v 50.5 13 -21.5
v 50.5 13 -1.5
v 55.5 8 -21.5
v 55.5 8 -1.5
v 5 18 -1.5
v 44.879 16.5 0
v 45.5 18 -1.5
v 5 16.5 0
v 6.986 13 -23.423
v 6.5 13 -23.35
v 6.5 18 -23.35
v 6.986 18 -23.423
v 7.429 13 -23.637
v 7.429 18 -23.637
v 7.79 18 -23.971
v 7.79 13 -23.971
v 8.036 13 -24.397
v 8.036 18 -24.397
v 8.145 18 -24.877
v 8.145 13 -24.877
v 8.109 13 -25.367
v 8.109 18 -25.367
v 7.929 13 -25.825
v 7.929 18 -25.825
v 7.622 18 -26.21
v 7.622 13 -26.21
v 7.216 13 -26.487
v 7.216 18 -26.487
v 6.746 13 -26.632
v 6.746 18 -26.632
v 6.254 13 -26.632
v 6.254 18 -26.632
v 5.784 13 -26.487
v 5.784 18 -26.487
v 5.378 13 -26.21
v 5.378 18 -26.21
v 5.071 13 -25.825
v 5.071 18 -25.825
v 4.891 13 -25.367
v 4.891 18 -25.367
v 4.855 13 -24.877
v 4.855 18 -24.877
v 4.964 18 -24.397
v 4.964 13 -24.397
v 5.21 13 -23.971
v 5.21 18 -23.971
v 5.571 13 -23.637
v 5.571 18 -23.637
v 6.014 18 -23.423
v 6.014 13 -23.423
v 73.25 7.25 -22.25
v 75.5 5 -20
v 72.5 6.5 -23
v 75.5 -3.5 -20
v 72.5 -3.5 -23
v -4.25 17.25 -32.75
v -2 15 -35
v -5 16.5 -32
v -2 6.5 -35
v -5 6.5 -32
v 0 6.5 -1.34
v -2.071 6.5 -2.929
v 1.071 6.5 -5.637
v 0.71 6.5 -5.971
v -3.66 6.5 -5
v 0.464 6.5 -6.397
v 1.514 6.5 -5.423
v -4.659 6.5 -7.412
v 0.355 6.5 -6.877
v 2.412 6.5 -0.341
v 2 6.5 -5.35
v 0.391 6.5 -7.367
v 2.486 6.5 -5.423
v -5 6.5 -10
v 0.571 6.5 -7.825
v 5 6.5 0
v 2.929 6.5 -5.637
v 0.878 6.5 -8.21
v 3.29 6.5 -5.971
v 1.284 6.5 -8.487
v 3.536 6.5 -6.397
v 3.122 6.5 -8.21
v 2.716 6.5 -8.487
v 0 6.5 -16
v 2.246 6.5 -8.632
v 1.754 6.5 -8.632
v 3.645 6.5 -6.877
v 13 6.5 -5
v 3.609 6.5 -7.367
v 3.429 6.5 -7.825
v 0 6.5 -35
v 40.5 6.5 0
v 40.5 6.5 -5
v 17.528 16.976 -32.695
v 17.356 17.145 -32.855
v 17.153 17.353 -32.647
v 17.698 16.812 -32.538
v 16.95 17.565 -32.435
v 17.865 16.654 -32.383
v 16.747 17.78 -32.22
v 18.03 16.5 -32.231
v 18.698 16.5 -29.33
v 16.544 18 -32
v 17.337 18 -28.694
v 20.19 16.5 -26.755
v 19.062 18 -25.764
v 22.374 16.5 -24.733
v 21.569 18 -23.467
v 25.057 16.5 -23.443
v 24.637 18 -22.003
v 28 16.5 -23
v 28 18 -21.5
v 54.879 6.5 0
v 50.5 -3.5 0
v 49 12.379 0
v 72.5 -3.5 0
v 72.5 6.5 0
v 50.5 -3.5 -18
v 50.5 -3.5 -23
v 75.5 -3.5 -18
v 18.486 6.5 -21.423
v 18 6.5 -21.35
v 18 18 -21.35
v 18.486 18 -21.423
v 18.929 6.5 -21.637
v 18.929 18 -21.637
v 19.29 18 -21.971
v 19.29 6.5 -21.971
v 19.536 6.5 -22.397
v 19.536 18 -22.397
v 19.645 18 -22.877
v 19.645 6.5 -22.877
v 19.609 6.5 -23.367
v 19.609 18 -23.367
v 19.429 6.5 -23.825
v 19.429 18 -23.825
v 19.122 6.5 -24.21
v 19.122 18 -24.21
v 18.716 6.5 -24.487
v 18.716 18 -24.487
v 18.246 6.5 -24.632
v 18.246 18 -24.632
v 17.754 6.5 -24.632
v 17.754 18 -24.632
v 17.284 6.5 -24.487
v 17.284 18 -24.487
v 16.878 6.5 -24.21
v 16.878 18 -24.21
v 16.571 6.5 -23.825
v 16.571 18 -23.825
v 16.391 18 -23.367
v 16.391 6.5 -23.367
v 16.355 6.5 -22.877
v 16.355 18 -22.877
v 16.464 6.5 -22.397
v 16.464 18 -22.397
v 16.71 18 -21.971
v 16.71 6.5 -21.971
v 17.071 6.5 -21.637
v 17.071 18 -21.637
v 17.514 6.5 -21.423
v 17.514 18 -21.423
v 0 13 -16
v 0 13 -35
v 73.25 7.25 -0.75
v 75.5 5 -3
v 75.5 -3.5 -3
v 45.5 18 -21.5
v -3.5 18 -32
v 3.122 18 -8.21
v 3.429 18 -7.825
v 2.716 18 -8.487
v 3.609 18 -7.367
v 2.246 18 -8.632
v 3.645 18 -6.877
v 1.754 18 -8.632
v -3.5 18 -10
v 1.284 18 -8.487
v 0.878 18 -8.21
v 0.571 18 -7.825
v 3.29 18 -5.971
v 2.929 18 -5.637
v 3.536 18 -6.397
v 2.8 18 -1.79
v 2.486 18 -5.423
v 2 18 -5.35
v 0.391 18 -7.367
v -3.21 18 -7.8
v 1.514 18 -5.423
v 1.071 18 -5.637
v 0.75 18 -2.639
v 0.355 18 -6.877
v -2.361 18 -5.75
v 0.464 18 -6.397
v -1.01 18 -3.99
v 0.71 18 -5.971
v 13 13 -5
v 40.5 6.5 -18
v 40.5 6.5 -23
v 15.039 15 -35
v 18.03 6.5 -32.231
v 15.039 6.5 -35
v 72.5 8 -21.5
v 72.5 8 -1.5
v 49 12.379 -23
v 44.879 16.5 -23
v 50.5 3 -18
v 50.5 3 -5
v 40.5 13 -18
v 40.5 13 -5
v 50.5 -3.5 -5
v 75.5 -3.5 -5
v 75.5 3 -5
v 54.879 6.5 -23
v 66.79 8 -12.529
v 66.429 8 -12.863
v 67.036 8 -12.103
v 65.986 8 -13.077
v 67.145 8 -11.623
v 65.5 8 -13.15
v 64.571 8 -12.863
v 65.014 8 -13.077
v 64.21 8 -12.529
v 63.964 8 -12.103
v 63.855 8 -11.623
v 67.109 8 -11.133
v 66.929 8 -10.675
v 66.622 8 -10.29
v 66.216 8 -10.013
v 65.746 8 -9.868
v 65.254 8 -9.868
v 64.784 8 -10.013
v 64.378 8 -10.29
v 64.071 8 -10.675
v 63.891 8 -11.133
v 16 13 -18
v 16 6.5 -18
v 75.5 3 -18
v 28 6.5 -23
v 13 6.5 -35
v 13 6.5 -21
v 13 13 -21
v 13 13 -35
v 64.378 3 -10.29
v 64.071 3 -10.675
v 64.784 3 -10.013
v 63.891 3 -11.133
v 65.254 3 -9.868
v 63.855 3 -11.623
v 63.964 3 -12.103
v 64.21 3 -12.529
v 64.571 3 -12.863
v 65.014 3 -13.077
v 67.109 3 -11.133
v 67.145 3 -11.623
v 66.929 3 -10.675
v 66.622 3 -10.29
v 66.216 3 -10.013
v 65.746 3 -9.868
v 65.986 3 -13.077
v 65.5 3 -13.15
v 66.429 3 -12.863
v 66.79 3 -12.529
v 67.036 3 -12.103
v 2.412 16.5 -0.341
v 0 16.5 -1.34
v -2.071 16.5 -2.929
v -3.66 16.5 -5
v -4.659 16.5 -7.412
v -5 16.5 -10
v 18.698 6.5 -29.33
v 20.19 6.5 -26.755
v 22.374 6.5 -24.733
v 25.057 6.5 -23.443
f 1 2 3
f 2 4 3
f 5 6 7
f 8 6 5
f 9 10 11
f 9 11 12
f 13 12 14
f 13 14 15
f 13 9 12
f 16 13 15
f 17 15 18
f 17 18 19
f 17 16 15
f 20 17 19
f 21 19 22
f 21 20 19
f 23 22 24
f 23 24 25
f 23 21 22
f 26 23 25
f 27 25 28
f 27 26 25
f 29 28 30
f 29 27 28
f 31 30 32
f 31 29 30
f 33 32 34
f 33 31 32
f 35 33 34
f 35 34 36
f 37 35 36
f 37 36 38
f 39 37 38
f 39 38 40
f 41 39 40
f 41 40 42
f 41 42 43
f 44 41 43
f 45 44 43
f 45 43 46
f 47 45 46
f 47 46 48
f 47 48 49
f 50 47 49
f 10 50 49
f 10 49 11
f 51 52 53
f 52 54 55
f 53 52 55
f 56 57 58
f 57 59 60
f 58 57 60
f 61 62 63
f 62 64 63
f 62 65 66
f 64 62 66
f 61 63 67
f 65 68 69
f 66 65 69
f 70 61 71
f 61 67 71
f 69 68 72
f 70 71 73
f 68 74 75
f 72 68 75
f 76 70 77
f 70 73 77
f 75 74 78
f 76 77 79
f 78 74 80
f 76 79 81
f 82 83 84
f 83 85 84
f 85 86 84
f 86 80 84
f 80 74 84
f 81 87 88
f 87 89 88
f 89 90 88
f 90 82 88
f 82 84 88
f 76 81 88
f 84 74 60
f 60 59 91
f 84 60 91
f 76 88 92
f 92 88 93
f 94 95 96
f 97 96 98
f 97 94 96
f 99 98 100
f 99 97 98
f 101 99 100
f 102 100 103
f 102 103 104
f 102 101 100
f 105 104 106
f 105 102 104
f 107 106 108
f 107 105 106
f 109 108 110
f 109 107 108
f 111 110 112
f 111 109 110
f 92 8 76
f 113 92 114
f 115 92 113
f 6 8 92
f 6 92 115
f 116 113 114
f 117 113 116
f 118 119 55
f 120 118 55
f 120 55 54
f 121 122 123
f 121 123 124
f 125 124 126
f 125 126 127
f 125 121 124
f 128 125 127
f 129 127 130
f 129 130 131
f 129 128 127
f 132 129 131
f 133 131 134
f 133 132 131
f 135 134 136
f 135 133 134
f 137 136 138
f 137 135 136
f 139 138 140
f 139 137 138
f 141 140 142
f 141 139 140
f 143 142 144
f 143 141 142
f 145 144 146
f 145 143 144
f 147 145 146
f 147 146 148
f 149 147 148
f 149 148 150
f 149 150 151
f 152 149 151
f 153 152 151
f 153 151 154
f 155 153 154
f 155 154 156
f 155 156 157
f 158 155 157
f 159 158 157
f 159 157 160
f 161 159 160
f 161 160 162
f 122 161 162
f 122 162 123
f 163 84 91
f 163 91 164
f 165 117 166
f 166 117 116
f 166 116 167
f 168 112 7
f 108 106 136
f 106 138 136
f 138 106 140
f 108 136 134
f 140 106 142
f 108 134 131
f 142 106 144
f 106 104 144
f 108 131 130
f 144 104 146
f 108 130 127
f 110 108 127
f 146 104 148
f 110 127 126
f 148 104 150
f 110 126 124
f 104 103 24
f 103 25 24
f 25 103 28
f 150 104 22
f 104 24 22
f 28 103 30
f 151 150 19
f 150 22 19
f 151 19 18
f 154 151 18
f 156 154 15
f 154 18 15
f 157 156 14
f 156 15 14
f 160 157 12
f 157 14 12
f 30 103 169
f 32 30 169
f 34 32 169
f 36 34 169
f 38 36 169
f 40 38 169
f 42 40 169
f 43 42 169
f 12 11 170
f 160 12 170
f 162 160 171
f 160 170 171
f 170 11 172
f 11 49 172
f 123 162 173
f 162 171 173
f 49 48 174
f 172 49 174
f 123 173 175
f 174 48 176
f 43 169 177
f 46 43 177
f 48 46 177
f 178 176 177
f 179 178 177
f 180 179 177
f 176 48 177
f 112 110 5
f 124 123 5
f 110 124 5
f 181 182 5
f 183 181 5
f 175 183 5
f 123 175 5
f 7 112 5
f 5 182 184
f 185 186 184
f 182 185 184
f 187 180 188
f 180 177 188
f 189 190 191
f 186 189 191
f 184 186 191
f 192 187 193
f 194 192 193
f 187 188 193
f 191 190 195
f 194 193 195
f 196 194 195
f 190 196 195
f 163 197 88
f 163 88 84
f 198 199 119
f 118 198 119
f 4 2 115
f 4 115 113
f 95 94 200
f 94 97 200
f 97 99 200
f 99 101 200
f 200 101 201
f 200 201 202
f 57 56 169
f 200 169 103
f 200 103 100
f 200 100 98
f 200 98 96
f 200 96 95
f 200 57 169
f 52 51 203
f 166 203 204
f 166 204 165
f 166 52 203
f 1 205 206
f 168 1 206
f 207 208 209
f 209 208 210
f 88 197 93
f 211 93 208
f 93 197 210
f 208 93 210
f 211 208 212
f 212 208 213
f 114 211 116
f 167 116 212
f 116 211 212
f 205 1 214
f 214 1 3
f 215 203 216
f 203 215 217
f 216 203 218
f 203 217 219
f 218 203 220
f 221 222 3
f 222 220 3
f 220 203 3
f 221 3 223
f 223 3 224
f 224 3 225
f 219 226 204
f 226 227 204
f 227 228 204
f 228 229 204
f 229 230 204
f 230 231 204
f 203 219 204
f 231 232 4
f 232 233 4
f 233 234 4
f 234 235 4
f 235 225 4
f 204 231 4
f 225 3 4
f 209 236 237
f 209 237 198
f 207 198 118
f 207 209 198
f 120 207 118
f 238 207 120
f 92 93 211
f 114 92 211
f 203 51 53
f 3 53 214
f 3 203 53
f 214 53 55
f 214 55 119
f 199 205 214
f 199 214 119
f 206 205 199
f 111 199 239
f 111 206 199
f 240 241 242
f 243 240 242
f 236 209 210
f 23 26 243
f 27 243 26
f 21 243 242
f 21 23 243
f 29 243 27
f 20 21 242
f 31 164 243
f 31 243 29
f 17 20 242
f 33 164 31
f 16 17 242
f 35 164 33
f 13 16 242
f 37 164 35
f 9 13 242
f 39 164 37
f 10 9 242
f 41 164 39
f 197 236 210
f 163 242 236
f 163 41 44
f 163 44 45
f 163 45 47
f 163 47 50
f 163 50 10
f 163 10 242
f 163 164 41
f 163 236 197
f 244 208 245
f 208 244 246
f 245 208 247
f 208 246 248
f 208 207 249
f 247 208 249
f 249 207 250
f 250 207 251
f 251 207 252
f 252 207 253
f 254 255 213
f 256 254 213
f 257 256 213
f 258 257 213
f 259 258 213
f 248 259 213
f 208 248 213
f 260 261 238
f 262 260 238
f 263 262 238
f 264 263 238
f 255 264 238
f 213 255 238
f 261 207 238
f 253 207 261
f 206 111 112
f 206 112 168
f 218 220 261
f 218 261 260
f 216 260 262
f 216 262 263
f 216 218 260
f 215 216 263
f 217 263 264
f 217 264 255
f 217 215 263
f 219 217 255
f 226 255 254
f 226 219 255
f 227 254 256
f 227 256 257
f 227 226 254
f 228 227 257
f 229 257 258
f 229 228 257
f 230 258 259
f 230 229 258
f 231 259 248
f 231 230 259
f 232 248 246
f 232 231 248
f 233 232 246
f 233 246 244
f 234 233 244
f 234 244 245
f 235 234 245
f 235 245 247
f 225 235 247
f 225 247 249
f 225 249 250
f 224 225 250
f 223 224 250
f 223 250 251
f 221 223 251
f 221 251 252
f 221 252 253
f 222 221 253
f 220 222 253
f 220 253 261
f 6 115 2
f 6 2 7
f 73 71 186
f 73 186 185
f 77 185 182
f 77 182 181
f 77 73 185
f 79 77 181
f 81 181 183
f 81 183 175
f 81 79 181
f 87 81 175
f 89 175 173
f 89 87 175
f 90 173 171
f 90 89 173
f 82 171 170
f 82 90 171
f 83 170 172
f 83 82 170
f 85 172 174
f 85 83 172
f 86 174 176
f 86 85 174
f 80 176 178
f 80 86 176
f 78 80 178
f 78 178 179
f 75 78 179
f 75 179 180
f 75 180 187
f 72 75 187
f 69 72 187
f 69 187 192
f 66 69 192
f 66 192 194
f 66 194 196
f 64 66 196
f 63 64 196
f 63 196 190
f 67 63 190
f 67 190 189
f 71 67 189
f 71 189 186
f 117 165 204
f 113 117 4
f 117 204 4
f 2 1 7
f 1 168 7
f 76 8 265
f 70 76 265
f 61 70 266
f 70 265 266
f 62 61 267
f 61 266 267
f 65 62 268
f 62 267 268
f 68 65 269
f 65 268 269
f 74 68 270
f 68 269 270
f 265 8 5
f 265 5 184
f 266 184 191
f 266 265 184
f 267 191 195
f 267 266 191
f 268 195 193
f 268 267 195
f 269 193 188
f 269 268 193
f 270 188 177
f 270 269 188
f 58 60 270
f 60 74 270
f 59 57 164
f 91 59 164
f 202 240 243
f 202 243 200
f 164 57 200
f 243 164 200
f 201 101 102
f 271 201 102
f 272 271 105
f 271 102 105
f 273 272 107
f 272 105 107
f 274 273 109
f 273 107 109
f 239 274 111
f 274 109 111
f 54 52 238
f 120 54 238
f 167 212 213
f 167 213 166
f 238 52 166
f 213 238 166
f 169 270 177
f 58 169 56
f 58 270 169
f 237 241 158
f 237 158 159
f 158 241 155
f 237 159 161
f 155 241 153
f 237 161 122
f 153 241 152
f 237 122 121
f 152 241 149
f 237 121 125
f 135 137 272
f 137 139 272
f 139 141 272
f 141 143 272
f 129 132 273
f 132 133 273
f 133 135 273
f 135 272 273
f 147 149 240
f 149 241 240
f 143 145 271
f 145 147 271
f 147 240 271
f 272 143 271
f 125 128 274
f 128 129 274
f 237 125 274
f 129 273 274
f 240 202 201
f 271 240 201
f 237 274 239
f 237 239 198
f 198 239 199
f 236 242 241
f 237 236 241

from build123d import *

# Parameters (mm, degrees)
SKETCH_1_W          = 23
SKETCH_1_H          = 23
SKETCH_1_W_2        = 13
SKETCH_1_H_2        = 13
EXTRUDE_1_DEPTH     = 35
SKETCH_2_R          = 1.65
CUT_EXTRUDE_1_DEPTH = 34
SKETCH_4_W          = 23
SKETCH_4_H          = 23
SKETCH_4_R          = 3
EXTRUDE_2_DEPTH     = 3.5
SKETCH_5_W          = 23
SKETCH_5_H          = 23
SKETCH_5_W_2        = 13
SKETCH_5_H_2        = 13
EXTRUDE_1_2_DEPTH   = 54
SKETCH_6_R          = 1.65
CUT_EXTRUDE_2_DEPTH = 39
SKETCH_7_W          = 13
SKETCH_7_H          = 13
CUT_EXTRUDE_3_DEPTH = 13
CHAMFER_1_SIZE      = 3
SKETCH_8_W          = 80.5
SKETCH_8_H          = 35
CUT_EXTRUDE_4_DEPTH = 11.5
EXTRUDE_3_DEPTH     = 6.5
FILLET_1_R          = 10
FILLET_2_R          = 10
SKETCH_10_R         = 1.65
CUT_EXTRUDE_5_DEPTH = 28.5
CHAMFER_4_SIZE      = 3
CHAMFER_START       = 6.5
CHAMFER_5_DEPTH     = 11.5
SKETCH_11_W         = 10
SKETCH_11_H         = 13
EXTRUDE_4_DEPTH     = 10
CHAMFER_9_SIZE      = 5
CHAMFER_10_SIZE     = 5
CHAMFER_11_SIZE     = 10
CHAMFER_12_SIZE     = 10
CHAMFER_13_SIZE     = 1.5
CHAMFER_14_SIZE     = 1.5
SKETCH_12_W         = 99.580162389
SKETCH_12_H         = 41.70081518
CUT_EXTRUDE_6_DEPTH = 35


with BuildPart() as part:
    # 草图1 → Extrude 1 (new body)
    with BuildSketch(Plane.XY):
        with Locations((6.5, 6.5)):
            Rectangle(SKETCH_1_W, SKETCH_1_H)
        with Locations((6.5, 6.5)):
            Rectangle(SKETCH_1_W_2, SKETCH_1_H_2, mode=Mode.SUBTRACT)
    extrude(amount=EXTRUDE_1_DEPTH)

    # 草图2 → 切除-拉伸1 (cut)
    with BuildSketch(Plane.XZ.offset(5)):
        with Locations(Location((6.5, 25, 0), (0, 0, 270))):
            Circle(SKETCH_2_R)
    extrude(amount=-CUT_EXTRUDE_1_DEPTH, mode=Mode.SUBTRACT)

    # 草图4 → 凸台-拉伸2 (add)
    with BuildSketch(Plane(origin=(18, 0, 0), x_dir=(0, 0, -1), z_dir=(1, 0, 0))):
        with Locations((-11.5, 6.5)):
            Rectangle(SKETCH_4_W, SKETCH_4_H)
        with Locations(Location((-11.5, 6.5, 0), (0, 0, 90))):
            Circle(SKETCH_4_R, mode=Mode.SUBTRACT)
    extrude(amount=EXTRUDE_2_DEPTH)

    # 草图5 → Extrude 1 2 (add)
    with BuildSketch(Plane(origin=(21.5, 0, 0), x_dir=(0, 0, -1), z_dir=(1, 0, 0))):
        with Locations((-11.5, 6.5)):
            Rectangle(SKETCH_5_W, SKETCH_5_H)
        with Locations((-11.5, 6.5)):
            Rectangle(SKETCH_5_W_2, SKETCH_5_H_2, mode=Mode.SUBTRACT)
    extrude(amount=EXTRUDE_1_2_DEPTH)

    # 草图6 → 切除-拉伸2 (cut)
    with BuildSketch(Plane(origin=(0, 18, 0), x_dir=(1, 0, 0), z_dir=(0, 1, 0))):
        with Locations(Location((65.5, -11.5, 0), (0, 0, 270))):
            Circle(SKETCH_6_R)
    extrude(amount=-CUT_EXTRUDE_2_DEPTH, mode=Mode.SUBTRACT)

    # 草图7 → 切除-拉伸3 (cut)
    with BuildSketch(Plane(origin=(21.5, 0, 0), x_dir=(0, 0, -1), z_dir=(1, 0, 0))):
        with Locations((-11.5, 6.5)):
            Rectangle(SKETCH_7_W, SKETCH_7_H)
    extrude(amount=-CUT_EXTRUDE_3_DEPTH, mode=Mode.SUBTRACT)

    # 倒角1
    chamfer_1_edges = [part.edges().sort_by_distance(p)[0] for p in [
        (13, 6.5, 18),
    ]]
    chamfer(chamfer_1_edges, length=CHAMFER_1_SIZE)

    # 草图8 → 切除-拉伸4 (cut)
    with BuildSketch(Plane.XZ.offset(5)):
        with Locations((35.25, 17.5)):
            Rectangle(SKETCH_8_W, SKETCH_8_H)
    extrude(amount=-CUT_EXTRUDE_4_DEPTH, mode=Mode.SUBTRACT)

    # 草图9 → 凸台-拉伸3 (add)
    with BuildSketch(Plane.XZ.offset(-13)):
        Polygon((13, 5), (0, 16), (0, 0), (13, 0), align=None)
    extrude(amount=EXTRUDE_3_DEPTH)

    # 圆角1
    fillet_1_edges = [part.edges().sort_by_distance(p)[0] for p in [
        (-5, 12.25, 0),
    ]]
    fillet(fillet_1_edges, radius=FILLET_1_R)

    # 圆角2
    fillet_2_edges = [part.edges().sort_by_distance(p)[0] for p in [
        (18, 12.25, 23),
    ]]
    fillet(fillet_2_edges, radius=FILLET_2_R)

    # 草图10 → 切除-拉伸5 (cut)
    with BuildSketch(Plane.XZ.offset(-6.5)):
        with Locations(Location((2, 7, 0), (0, 0, 270))):
            Circle(SKETCH_10_R)
        with Locations(Location((18, 23, 0), (0, 0, 270))):
            Circle(SKETCH_10_R)
    extrude(amount=-CUT_EXTRUDE_5_DEPTH, mode=Mode.SUBTRACT)

    # 倒角4
    chamfer_4_edges = [part.edges().sort_by_distance(p)[0] for p in [
        (75.5, 18, 11.5),
        (6.5, 18, 35),
    ]]
    chamfer(chamfer_4_edges, length=CHAMFER_4_SIZE)

    # 倒角5: read off the stored shape, not the designer's step
    # 倒角5 outline → 倒角5 (cut)
    with BuildSketch(Plane(origin=(0, 0, 0), x_dir=(1, 0, 0), z_dir=(0, 1, 0)).offset(CHAMFER_START)):
        Polygon((72.5, 0), (75.5, -3), (75.5, 0), align=None)
        Polygon((-5, -35), (-2, -35), (-5, -32), align=None)
        with BuildLine():
            ThreePointArc((18, -33), (18.007410169, -32.615099398), (18.029629695, -32.230769231))
            Line((18.029629695, -32.230769231), (15.038518603, -35))
            Line((15.038518603, -35), (18, -35))
            Line((18, -35), (18, -33))
        make_face()
        Polygon((75.5, -20), (72.5, -23), (75.5, -23), align=None)
    extrude(amount=CHAMFER_5_DEPTH, mode=Mode.SUBTRACT)


with BuildPart() as body_2:
    # Split Bodies 1: the piece on the far side of the plane
    add(part.part)
    split(bisect_by=Plane.YZ.offset(50.5), keep=Keep.BOTTOM)


with BuildPart() as part_1:
    add(part.part)

    # Split Bodies 1
    split(bisect_by=Plane.YZ.offset(50.5), keep=Keep.TOP)


with BuildPart() as part_2:
    # Move Body 1: read off the stored shape, not the designer's step
    # Move Body 1: moved
    add(part_1.part.moved(Location((0, -10, 0))))

    # Combine 1: union body 2
    add(body_2.part)

    # 草图11 → 凸台-拉伸4 (add)
    with BuildSketch(Plane.XZ.offset(-13)):
        with Locations((45.5, 11.5)):
            Rectangle(SKETCH_11_W, SKETCH_11_H)
    extrude(amount=EXTRUDE_4_DEPTH)

    # 倒角9
    chamfer_9_edges = [part_2.edges().sort_by_distance(p)[0] for p in [
        (50.5, 18, 11.5),
    ]]
    chamfer(chamfer_9_edges, length=CHAMFER_9_SIZE)

    # 倒角10
    chamfer_10_edges = [part_2.edges().sort_by_distance(p)[0] for p in [
        (50.5, 8, 11.5),
    ]]
    chamfer(chamfer_10_edges, length=CHAMFER_10_SIZE - 0.0001)  # a hair under: the kernel refuses the full size

    # 倒角11
    # the kernel refuses this chamfer: 10 mm, written as the material it adds along each edge
    with BuildSketch(Plane(origin=(50.5, 6.5, 30.71682988), x_dir=(-1, 0, 0), z_dir=(0, 0, -1))) as chamfer_11_piece_1_section:
        Polygon((CHAMFER_11_SIZE, 0), (0, -CHAMFER_11_SIZE), (0, 0), align=None)
    chamfer_11_piece_1 = extrude(amount=30.71682988, mode=Mode.PRIVATE)
    chamfer_11_piece_1 = split(chamfer_11_piece_1, bisect_by=Plane(origin=(50.5, -3.5, 30.71682988), z_dir=(0, 1, 0)), keep=Keep.TOP, mode=Mode.PRIVATE)
    chamfer_11_piece_1 = split(chamfer_11_piece_1, bisect_by=Plane(origin=(50.5, 6.5, 23), z_dir=(0, 0, -1)), keep=Keep.TOP, mode=Mode.PRIVATE)
    chamfer_11_piece_1 = split(chamfer_11_piece_1, bisect_by=Plane(origin=(50.5, 6.5, 18), z_dir=(0, 0, 1)), keep=Keep.TOP, mode=Mode.PRIVATE)
    add(chamfer_11_piece_1)
    with BuildSketch(Plane(origin=(50.5, 6.5, 5), x_dir=(-1, 0, 0), z_dir=(0, 0, -1))) as chamfer_11_piece_2_section:
        Polygon((CHAMFER_11_SIZE, 0), (0, -CHAMFER_11_SIZE), (0, 0), align=None)
    chamfer_11_piece_2 = extrude(amount=5, mode=Mode.PRIVATE)
    chamfer_11_piece_2 = split(chamfer_11_piece_2, bisect_by=Plane(origin=(50.5, -3.5, 5), z_dir=(0, 1, 0)), keep=Keep.TOP, mode=Mode.PRIVATE)
    add(chamfer_11_piece_2)
    with BuildSketch(Plane(origin=(50.5, 6.5, 23), x_dir=(-1, 0, 0), z_dir=(0, 0, -1))) as chamfer_11_piece_3_section:
        Polygon((CHAMFER_11_SIZE, 0), (0, -CHAMFER_11_SIZE), (0, 0), align=None)
    chamfer_11_piece_3 = extrude(amount=5, mode=Mode.PRIVATE)
    chamfer_11_piece_3 = split(chamfer_11_piece_3, bisect_by=Plane(origin=(50.5, -3.5, 23), z_dir=(0, 1, 0)), keep=Keep.TOP, mode=Mode.PRIVATE)
    add(chamfer_11_piece_3)
    with BuildSketch(Plane(origin=(50.5, 6.5, 23), x_dir=(-1, 0, 0), z_dir=(0, 0, -1))) as chamfer_11_piece_4_section:
        Polygon((CHAMFER_11_SIZE, 0), (0, -CHAMFER_11_SIZE), (0, 0), align=None)
    chamfer_11_piece_4 = extrude(amount=30.71682988, mode=Mode.PRIVATE)
    chamfer_11_piece_4 = split(chamfer_11_piece_4, bisect_by=Plane(origin=(50.5, 6.5, 0), z_dir=(0, 0, 1)), keep=Keep.TOP, mode=Mode.PRIVATE)
    chamfer_11_piece_4 = split(chamfer_11_piece_4, bisect_by=Plane(origin=(50.5, -3.5, 23), z_dir=(0, 1, 0)), keep=Keep.TOP, mode=Mode.PRIVATE)
    chamfer_11_piece_4 = split(chamfer_11_piece_4, bisect_by=Plane(origin=(50.5, 6.5, 5), z_dir=(0, 0, -1)), keep=Keep.TOP, mode=Mode.PRIVATE)
    add(chamfer_11_piece_4)

    # 倒角12
    # the kernel refuses this chamfer: 10 mm, written as the material it takes off along each edge
    with BuildSketch(Plane(origin=(40.5, 3, 5), x_dir=(1, 0, 0), z_dir=(0, 0, 1))) as chamfer_12_piece_1:
        Polygon((CHAMFER_12_SIZE, 0), (0, CHAMFER_12_SIZE), (0, 0), align=None)
    extrude(amount=13, mode=Mode.SUBTRACT)

    # 倒角13
    chamfer_13_edges = [part_2.edges().sort_by_distance(p)[0] for p in [
        (-5, 18, 21),
        (-2.071067812, 18, 2.928932188),
        (25.25, 18, 0),
        (21.291796068, 18, 25.583801513),
        (36.75, 18, 23),
    ]]
    chamfer(chamfer_13_edges, length=CHAMFER_13_SIZE)

    # 倒角14
    chamfer_14_edges = [part_2.edges().sort_by_distance(p)[0] for p in [
        (48.75, 14.75, 0),
        (50.5, 12.99995, 0),
        (52.99995, 10.49995, 0),
        (63.99995, 8, 0),
        (48.75, 14.75, 23),
        (50.5, 12.99995, 23),
        (52.99995, 10.49995, 23),
        (63.99995, 8, 23),
    ]]
    chamfer(chamfer_14_edges, length=CHAMFER_14_SIZE)

    # 镜向1: part across face


with BuildPart() as part_3:
    add(part_2.part)
    add(part_2.part.mirror(Plane(origin=(39.29455316, 7.74366918, 0), x_dir=(1, 0, 0), z_dir=(0, 0, -1))))

    # 草图12 → 切除-拉伸6 (cut)
    with BuildSketch(Plane.XY.offset(35)):
        with Locations((40.094907988, 6.821209465)):
            Rectangle(SKETCH_12_W, SKETCH_12_H)
    extrude(amount=-CUT_EXTRUDE_6_DEPTH, mode=Mode.SUBTRACT)


solid = part_3.part
